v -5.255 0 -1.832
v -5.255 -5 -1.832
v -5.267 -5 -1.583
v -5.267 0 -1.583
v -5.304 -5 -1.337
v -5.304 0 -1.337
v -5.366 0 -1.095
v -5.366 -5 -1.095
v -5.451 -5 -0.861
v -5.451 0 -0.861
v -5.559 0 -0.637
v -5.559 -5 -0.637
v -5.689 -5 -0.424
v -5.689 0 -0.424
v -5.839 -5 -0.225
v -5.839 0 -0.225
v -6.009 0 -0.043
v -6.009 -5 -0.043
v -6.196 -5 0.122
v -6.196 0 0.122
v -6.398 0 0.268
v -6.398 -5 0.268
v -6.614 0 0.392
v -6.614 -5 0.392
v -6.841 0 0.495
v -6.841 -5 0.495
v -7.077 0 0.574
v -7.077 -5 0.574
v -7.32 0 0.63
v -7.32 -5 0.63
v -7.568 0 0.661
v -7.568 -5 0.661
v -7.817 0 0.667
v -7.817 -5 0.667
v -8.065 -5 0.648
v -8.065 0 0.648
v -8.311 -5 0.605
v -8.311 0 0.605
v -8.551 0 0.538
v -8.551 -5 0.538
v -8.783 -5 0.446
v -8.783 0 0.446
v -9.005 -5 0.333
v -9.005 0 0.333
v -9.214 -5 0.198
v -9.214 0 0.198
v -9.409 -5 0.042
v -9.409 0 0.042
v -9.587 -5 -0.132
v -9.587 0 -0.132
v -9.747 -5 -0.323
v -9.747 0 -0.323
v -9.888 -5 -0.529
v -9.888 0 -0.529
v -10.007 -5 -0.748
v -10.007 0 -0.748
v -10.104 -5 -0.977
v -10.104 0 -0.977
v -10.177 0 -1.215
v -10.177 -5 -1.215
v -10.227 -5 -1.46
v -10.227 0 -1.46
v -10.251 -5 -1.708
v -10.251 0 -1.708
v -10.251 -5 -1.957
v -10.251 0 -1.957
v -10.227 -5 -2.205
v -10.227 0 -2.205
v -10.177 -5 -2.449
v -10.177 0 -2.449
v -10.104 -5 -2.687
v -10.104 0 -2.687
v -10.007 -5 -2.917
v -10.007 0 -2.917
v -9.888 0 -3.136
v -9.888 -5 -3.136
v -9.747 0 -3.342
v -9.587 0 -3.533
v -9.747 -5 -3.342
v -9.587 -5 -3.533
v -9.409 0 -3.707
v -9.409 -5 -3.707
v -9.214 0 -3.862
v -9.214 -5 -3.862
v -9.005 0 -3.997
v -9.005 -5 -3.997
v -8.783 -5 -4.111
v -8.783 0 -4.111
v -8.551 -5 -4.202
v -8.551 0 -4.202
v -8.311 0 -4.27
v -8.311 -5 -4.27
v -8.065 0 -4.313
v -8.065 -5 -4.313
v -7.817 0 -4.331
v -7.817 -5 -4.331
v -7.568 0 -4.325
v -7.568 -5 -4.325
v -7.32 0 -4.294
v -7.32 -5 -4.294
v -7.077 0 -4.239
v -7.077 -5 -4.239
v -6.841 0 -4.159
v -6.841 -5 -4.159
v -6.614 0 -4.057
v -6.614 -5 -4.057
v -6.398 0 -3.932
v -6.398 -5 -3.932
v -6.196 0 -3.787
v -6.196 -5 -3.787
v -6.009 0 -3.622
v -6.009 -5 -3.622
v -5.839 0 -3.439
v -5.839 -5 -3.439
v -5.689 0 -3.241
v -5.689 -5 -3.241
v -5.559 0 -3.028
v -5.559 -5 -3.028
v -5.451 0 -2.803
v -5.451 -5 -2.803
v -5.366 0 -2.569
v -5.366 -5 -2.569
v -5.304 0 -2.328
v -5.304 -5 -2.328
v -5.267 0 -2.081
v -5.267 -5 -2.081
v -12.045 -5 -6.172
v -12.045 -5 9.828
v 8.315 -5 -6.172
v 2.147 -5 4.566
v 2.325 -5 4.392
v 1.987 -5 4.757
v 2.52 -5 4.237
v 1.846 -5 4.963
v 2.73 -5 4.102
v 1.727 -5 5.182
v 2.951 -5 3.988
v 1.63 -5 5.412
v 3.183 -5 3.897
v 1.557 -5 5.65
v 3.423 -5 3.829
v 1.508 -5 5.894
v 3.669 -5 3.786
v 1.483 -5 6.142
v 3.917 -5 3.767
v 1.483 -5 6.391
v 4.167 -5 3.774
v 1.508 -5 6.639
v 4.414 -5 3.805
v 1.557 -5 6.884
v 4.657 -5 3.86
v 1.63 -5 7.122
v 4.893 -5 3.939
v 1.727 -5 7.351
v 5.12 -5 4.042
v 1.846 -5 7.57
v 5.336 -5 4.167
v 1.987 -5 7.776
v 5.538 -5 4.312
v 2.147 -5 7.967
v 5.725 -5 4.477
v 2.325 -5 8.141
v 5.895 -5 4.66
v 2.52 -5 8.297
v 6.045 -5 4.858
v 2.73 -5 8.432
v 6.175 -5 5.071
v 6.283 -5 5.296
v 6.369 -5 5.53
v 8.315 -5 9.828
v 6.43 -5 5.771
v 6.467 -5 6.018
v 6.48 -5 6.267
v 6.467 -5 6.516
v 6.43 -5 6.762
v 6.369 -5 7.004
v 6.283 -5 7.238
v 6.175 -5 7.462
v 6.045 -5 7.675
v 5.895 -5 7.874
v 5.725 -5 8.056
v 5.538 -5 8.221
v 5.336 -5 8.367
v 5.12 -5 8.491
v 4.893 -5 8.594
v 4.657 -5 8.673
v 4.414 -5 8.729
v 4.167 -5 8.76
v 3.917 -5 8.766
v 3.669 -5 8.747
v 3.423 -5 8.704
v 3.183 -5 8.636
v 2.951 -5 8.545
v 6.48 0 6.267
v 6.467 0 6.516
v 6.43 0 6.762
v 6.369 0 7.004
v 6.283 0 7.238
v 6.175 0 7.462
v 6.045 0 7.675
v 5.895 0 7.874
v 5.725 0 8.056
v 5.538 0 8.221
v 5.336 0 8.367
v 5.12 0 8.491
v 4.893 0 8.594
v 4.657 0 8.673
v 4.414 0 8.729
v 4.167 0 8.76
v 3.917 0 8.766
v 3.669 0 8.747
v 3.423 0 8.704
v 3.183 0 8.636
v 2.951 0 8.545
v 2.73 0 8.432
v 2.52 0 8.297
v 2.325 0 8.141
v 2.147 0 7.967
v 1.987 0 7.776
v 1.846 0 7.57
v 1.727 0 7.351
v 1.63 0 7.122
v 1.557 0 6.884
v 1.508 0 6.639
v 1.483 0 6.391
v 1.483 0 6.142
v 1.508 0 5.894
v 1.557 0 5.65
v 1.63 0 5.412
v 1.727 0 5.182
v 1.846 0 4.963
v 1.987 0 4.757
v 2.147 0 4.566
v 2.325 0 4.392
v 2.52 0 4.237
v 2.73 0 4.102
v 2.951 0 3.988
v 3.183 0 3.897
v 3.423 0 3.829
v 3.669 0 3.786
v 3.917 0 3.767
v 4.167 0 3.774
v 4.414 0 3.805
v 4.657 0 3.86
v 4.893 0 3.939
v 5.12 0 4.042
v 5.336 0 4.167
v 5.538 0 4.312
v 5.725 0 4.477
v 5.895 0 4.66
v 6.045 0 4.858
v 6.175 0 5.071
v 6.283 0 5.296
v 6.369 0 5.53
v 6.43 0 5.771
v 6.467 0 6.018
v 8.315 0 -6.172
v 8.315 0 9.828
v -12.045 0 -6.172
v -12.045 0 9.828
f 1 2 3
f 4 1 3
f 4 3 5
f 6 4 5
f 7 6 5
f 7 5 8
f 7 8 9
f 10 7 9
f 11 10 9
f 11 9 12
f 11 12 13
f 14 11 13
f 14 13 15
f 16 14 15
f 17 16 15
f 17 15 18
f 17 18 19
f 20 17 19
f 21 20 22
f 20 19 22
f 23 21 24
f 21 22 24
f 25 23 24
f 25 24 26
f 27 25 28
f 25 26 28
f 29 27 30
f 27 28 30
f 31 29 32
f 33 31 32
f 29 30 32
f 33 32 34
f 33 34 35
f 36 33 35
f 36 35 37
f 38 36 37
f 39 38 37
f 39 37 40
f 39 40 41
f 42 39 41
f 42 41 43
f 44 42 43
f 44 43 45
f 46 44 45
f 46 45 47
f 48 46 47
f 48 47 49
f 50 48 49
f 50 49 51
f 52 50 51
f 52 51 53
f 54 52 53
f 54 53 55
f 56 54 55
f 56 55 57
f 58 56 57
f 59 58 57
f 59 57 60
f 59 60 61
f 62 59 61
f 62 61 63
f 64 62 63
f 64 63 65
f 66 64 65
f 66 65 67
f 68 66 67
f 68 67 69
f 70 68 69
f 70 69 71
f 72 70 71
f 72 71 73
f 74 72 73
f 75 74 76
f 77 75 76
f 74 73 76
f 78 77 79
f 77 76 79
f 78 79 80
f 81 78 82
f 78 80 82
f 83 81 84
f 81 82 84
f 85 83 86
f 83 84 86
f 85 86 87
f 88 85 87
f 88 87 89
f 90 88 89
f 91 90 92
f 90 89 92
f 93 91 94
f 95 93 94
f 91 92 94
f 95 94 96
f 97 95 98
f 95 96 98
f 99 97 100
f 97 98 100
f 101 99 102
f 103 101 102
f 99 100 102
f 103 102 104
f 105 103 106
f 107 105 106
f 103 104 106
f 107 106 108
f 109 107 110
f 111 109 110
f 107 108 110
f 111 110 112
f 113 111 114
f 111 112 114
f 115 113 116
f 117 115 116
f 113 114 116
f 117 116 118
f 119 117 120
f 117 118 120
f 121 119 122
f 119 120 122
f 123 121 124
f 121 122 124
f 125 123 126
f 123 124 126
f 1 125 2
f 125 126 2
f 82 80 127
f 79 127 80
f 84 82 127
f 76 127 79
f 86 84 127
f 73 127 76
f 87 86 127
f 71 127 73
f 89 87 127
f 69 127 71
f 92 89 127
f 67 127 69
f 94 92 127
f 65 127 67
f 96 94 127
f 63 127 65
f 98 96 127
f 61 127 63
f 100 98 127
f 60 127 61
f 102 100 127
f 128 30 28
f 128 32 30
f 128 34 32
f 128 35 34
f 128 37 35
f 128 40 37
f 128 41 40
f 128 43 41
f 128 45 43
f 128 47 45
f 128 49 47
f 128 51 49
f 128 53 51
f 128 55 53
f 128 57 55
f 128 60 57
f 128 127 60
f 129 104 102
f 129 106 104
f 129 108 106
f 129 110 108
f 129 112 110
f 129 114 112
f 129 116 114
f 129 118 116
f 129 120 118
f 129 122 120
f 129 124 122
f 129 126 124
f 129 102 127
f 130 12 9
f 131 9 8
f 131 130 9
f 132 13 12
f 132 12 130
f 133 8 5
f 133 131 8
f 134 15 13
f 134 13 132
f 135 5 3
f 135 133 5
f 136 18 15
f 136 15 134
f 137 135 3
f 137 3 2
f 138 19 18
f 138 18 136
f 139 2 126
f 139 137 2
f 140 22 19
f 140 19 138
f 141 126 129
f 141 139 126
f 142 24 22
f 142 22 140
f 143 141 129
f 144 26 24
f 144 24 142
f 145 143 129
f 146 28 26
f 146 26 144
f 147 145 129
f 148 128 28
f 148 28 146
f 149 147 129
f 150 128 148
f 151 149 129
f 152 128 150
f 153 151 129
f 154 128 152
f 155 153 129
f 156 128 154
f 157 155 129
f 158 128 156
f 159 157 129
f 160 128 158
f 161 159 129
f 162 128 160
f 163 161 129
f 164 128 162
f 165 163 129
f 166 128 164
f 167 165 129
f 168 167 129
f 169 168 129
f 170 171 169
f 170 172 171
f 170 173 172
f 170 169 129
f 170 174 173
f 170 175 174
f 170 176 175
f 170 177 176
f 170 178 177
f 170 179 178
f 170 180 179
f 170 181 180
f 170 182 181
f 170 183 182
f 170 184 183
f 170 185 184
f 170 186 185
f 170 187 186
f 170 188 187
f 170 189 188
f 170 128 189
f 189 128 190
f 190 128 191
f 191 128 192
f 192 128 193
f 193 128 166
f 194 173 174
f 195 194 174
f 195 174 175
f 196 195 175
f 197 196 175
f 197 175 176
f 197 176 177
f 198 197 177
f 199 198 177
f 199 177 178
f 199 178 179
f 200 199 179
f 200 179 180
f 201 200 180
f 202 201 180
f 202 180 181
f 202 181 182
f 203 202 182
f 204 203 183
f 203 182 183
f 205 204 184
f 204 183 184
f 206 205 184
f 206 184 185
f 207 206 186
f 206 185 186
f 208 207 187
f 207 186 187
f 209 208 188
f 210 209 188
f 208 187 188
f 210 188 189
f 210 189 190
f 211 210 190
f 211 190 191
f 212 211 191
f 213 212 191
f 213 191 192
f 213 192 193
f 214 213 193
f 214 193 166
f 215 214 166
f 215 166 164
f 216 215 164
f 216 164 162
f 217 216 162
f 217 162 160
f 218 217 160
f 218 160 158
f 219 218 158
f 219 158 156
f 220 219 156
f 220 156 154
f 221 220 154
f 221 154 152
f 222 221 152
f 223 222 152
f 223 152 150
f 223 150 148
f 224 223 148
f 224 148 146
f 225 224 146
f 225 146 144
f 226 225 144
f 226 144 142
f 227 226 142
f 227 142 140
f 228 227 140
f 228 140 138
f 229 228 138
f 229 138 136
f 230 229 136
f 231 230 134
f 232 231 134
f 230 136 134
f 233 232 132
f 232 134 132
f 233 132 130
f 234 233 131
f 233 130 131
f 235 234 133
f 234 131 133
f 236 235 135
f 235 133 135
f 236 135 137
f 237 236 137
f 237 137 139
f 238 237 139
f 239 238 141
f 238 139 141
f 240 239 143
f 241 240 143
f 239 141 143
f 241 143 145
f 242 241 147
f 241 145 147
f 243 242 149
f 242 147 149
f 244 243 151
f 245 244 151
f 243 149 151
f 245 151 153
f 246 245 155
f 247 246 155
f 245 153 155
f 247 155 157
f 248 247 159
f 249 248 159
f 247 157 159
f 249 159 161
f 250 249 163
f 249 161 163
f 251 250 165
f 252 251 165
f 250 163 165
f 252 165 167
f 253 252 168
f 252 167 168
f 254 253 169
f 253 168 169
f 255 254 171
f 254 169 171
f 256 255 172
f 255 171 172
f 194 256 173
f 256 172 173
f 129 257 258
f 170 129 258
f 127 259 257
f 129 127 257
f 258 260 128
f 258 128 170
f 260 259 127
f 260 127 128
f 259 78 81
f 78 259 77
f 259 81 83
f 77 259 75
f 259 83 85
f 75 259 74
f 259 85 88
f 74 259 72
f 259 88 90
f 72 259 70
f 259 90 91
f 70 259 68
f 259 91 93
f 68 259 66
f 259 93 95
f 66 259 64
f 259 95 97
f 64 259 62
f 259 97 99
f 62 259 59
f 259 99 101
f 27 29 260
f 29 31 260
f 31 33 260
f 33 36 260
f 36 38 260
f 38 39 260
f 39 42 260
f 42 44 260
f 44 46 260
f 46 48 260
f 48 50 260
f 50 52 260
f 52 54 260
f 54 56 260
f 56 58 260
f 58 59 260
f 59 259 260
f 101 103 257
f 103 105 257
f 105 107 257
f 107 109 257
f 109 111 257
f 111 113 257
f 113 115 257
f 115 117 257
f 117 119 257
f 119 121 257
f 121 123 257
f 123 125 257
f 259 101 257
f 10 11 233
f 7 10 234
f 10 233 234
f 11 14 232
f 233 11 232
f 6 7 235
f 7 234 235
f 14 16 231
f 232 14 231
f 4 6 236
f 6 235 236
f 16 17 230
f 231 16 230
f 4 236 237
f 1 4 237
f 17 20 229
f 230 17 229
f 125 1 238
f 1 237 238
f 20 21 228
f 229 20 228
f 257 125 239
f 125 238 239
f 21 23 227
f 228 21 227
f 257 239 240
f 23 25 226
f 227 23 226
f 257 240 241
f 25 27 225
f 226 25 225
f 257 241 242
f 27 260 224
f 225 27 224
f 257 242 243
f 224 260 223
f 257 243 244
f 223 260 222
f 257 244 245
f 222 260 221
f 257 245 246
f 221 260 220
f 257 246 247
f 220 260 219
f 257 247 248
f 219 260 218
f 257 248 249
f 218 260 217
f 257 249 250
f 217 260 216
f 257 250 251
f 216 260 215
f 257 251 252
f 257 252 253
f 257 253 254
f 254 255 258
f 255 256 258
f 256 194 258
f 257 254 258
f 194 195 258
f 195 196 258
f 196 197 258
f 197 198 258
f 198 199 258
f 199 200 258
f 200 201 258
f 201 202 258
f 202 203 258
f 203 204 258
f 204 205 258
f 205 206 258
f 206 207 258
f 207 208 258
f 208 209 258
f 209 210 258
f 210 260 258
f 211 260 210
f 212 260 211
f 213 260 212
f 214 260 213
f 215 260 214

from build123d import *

# Parameters (mm, degrees)
F0_W     = 20.36
F0_H     = 16
F1_DEPTH = 5
F2_R     = 2.5
F3_DEPTH = 5.001
F4_R     = 2.5
F5_DEPTH = 5.001


with BuildPart() as f1:
    # F0 (on Front) → F1 (new body)
    with BuildSketch(Plane.XZ):
        with Locations((-1.864513, 1.827734)):
            Rectangle(F0_W, F0_H)
    extrude(amount=F1_DEPTH)

    # F2 (on face) → F3 (cut, through all)
    with BuildSketch(Plane.XZ.offset(5)):
        with Locations((-7.754513, -1.832266)):
            Circle(F2_R)
    extrude(amount=-F3_DEPTH, mode=Mode.SUBTRACT)

    # F4 (on face) → F5 (cut, through all)
    with BuildSketch(Plane.XZ.offset(5)):
        with Locations((3.979688, 6.266656)):
            Circle(F4_R)
    extrude(amount=-F5_DEPTH, mode=Mode.SUBTRACT)


solid = f1.part
